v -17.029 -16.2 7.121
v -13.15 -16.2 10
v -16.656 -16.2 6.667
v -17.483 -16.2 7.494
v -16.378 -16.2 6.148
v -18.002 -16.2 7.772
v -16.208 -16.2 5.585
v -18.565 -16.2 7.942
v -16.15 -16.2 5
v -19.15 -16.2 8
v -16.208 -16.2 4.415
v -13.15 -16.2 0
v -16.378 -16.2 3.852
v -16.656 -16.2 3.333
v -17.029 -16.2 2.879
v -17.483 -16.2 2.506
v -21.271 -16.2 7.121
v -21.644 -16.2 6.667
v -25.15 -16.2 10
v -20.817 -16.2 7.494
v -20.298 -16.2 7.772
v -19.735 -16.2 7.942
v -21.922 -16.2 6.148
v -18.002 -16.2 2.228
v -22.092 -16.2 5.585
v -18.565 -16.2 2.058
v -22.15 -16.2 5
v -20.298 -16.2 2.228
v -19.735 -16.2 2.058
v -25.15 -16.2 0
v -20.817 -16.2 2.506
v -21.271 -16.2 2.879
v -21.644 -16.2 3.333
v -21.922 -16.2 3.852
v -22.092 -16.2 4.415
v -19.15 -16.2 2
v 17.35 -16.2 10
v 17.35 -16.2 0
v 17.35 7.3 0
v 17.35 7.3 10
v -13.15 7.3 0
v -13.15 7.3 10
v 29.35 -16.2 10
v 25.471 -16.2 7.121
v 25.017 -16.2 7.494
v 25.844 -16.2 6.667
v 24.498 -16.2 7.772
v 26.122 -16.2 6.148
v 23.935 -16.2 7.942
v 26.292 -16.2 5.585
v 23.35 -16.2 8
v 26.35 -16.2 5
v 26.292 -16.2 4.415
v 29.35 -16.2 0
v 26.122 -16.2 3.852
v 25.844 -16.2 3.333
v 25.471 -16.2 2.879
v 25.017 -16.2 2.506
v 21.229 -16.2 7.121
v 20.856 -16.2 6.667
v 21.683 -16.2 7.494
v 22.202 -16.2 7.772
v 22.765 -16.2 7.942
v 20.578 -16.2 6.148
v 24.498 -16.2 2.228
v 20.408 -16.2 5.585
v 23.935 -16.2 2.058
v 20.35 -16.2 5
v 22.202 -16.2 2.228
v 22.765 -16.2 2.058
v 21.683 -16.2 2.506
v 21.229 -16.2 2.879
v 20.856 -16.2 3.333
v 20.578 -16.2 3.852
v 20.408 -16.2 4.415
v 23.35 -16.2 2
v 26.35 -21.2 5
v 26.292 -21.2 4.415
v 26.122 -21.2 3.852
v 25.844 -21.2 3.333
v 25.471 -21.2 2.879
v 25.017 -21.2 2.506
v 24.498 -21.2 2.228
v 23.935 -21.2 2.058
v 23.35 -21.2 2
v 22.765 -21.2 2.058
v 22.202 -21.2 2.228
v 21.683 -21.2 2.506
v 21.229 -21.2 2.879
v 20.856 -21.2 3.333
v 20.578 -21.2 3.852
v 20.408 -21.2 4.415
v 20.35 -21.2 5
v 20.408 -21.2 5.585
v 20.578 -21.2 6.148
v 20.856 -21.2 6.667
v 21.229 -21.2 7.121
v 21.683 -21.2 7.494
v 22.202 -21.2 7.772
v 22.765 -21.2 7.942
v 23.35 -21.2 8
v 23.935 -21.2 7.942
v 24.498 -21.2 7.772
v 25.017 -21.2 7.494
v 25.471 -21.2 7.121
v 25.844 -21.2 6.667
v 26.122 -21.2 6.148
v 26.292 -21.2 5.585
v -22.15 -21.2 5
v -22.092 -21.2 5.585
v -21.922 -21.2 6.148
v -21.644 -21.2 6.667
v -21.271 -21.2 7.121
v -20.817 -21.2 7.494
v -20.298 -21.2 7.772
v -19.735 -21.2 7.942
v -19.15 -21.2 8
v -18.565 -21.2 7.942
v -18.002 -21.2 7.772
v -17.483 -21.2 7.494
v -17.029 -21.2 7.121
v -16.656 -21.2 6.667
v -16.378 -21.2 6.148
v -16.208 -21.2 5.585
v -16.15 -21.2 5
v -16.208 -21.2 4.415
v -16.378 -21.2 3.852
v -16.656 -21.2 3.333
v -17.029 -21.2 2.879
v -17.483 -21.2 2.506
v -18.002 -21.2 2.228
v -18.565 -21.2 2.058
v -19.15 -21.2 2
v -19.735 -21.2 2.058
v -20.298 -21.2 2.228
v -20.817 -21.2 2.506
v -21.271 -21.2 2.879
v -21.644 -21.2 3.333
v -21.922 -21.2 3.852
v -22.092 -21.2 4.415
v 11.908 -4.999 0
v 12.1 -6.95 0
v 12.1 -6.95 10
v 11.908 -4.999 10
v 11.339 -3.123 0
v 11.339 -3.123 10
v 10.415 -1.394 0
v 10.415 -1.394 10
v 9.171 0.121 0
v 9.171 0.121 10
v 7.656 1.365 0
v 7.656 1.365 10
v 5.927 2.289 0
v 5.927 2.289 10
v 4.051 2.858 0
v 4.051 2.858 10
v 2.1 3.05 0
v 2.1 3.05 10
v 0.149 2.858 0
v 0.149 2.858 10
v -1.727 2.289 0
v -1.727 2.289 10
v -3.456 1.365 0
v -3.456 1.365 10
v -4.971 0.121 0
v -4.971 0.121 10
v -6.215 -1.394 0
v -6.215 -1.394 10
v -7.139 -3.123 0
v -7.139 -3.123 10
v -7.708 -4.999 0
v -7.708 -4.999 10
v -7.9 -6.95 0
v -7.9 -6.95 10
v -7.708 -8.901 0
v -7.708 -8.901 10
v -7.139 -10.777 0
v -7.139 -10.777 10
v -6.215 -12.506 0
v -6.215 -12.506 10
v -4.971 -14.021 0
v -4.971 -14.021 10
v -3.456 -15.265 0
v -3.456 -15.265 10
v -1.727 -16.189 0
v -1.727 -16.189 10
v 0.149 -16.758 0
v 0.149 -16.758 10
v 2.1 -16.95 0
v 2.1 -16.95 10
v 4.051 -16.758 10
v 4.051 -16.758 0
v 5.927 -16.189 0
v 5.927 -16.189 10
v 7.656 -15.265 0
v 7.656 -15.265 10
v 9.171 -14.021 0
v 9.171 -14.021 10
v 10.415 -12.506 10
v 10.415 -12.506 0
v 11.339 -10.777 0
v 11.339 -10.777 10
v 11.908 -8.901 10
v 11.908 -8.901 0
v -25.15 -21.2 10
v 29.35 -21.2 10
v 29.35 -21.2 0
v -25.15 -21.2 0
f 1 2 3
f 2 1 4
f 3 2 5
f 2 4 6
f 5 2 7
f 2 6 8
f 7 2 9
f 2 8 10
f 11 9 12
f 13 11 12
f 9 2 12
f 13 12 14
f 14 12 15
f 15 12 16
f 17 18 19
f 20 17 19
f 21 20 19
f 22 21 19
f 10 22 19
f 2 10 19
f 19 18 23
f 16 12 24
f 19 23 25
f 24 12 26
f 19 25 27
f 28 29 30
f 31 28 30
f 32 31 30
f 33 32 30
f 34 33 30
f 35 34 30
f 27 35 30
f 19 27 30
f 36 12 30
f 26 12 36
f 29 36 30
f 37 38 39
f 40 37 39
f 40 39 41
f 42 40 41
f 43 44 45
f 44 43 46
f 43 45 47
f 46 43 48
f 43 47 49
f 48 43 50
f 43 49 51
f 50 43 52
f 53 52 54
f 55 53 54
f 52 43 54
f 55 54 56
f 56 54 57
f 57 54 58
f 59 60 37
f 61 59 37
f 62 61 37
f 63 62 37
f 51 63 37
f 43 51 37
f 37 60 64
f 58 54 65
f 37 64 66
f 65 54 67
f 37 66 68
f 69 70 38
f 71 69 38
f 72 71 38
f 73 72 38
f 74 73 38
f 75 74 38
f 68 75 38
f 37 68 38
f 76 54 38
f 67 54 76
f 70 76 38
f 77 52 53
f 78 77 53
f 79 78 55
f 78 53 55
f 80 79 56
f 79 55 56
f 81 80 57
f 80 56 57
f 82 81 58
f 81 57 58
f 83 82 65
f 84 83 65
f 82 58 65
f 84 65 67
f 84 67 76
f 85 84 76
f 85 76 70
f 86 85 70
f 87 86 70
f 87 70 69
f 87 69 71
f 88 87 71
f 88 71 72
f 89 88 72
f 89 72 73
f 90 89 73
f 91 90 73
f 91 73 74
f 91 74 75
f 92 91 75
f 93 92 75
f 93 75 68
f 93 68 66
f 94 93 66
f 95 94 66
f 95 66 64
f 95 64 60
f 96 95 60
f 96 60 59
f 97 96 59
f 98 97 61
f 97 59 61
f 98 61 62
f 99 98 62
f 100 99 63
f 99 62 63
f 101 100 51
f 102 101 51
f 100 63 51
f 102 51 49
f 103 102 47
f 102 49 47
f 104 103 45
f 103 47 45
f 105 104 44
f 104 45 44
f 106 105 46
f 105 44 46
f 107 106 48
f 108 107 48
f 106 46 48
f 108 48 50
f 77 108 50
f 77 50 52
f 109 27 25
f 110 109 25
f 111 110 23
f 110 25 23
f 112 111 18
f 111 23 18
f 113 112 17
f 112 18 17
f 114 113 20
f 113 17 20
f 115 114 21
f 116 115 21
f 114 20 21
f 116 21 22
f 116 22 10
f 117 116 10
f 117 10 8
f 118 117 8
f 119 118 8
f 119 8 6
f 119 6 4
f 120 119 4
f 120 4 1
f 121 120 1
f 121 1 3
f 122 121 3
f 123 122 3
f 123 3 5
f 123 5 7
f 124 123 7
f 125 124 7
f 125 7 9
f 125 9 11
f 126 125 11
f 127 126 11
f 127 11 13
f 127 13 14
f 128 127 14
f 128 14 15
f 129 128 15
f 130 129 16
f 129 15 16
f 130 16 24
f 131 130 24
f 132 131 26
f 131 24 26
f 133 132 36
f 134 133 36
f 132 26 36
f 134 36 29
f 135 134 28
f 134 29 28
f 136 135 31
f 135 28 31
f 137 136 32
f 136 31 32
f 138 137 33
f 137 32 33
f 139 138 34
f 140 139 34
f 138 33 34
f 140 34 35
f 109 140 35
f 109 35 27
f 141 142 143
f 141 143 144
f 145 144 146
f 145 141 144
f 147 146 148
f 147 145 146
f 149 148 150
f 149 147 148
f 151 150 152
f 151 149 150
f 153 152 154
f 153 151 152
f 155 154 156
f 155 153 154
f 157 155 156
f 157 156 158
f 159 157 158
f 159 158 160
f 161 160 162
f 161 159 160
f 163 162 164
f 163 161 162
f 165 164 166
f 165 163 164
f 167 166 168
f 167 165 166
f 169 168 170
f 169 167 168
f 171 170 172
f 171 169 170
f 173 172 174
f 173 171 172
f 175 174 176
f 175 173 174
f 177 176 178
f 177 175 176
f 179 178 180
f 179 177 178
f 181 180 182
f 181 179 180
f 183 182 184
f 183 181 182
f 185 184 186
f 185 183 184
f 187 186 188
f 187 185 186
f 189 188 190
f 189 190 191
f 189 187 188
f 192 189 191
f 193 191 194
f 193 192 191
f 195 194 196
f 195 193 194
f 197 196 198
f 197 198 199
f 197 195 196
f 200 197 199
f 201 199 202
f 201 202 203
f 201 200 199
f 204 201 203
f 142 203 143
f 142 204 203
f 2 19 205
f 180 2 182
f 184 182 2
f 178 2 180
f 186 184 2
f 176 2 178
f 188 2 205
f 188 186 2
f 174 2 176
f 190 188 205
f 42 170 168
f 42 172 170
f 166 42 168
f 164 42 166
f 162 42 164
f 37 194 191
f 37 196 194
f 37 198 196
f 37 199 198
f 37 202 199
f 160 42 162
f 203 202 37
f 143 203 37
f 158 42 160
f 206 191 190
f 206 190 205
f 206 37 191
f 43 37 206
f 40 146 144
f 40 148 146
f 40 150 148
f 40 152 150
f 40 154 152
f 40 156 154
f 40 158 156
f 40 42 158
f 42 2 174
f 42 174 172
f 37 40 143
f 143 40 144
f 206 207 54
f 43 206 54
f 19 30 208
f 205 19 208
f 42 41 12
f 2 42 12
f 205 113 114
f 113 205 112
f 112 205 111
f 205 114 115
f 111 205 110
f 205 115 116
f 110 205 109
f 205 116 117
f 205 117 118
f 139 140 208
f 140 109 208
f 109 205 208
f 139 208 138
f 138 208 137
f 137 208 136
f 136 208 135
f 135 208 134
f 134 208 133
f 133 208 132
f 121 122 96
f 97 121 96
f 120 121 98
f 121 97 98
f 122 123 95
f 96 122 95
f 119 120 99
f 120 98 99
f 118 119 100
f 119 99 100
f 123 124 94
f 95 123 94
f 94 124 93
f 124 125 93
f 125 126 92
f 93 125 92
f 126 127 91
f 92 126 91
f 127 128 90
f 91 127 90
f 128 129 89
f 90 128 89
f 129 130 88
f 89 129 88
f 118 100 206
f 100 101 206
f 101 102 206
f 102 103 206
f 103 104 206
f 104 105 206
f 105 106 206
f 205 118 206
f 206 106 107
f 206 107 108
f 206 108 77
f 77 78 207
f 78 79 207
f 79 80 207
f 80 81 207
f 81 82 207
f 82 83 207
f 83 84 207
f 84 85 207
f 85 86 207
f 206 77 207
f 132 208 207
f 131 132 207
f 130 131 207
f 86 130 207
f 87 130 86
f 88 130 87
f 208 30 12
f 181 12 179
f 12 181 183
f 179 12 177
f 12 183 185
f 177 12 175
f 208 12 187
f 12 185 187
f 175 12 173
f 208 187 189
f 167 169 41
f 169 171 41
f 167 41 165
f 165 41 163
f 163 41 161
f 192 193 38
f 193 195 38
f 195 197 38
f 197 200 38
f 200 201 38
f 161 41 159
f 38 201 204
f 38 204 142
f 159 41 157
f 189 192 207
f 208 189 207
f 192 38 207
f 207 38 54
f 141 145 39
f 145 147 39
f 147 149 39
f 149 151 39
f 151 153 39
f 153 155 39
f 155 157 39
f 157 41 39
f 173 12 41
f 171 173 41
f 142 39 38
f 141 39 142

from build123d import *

# Parameters (mm, degrees)
SKETCH_1_R          = 10
EXTRUDE_1_DEPTH     = 10
SKETCH_2_R          = 3
CUT_EXTRUDE_1_DEPTH = 43.114991393


with BuildPart() as part:
    # 草图1 → 凸台-拉伸1 (new body)
    with BuildSketch(Plane.XY):
        Polygon((17.35, 7.3), (-13.15, 7.3), (-13.15, -16.2), (-25.15, -16.2), (-25.15, -21.2), (29.35, -21.2), (29.35, -16.2), (17.35, -16.2), align=None)
        with Locations((2.1, -6.95)):
            Circle(SKETCH_1_R, mode=Mode.SUBTRACT)
    extrude(amount=EXTRUDE_1_DEPTH)

    # 草图2 → 切除-拉伸1 (cut, through all)
    with BuildSketch(Plane(origin=(0, 7.3, 0), x_dir=(1, 0, 0), z_dir=(0, 1, 0))):
        with Locations(Location((-19.15, -5, 0), (0, 0, 180))):
            Circle(SKETCH_2_R)
        with Locations((23.35, -5)):
            Circle(SKETCH_2_R)
    extrude(amount=-CUT_EXTRUDE_1_DEPTH, mode=Mode.SUBTRACT)


solid = part.part
